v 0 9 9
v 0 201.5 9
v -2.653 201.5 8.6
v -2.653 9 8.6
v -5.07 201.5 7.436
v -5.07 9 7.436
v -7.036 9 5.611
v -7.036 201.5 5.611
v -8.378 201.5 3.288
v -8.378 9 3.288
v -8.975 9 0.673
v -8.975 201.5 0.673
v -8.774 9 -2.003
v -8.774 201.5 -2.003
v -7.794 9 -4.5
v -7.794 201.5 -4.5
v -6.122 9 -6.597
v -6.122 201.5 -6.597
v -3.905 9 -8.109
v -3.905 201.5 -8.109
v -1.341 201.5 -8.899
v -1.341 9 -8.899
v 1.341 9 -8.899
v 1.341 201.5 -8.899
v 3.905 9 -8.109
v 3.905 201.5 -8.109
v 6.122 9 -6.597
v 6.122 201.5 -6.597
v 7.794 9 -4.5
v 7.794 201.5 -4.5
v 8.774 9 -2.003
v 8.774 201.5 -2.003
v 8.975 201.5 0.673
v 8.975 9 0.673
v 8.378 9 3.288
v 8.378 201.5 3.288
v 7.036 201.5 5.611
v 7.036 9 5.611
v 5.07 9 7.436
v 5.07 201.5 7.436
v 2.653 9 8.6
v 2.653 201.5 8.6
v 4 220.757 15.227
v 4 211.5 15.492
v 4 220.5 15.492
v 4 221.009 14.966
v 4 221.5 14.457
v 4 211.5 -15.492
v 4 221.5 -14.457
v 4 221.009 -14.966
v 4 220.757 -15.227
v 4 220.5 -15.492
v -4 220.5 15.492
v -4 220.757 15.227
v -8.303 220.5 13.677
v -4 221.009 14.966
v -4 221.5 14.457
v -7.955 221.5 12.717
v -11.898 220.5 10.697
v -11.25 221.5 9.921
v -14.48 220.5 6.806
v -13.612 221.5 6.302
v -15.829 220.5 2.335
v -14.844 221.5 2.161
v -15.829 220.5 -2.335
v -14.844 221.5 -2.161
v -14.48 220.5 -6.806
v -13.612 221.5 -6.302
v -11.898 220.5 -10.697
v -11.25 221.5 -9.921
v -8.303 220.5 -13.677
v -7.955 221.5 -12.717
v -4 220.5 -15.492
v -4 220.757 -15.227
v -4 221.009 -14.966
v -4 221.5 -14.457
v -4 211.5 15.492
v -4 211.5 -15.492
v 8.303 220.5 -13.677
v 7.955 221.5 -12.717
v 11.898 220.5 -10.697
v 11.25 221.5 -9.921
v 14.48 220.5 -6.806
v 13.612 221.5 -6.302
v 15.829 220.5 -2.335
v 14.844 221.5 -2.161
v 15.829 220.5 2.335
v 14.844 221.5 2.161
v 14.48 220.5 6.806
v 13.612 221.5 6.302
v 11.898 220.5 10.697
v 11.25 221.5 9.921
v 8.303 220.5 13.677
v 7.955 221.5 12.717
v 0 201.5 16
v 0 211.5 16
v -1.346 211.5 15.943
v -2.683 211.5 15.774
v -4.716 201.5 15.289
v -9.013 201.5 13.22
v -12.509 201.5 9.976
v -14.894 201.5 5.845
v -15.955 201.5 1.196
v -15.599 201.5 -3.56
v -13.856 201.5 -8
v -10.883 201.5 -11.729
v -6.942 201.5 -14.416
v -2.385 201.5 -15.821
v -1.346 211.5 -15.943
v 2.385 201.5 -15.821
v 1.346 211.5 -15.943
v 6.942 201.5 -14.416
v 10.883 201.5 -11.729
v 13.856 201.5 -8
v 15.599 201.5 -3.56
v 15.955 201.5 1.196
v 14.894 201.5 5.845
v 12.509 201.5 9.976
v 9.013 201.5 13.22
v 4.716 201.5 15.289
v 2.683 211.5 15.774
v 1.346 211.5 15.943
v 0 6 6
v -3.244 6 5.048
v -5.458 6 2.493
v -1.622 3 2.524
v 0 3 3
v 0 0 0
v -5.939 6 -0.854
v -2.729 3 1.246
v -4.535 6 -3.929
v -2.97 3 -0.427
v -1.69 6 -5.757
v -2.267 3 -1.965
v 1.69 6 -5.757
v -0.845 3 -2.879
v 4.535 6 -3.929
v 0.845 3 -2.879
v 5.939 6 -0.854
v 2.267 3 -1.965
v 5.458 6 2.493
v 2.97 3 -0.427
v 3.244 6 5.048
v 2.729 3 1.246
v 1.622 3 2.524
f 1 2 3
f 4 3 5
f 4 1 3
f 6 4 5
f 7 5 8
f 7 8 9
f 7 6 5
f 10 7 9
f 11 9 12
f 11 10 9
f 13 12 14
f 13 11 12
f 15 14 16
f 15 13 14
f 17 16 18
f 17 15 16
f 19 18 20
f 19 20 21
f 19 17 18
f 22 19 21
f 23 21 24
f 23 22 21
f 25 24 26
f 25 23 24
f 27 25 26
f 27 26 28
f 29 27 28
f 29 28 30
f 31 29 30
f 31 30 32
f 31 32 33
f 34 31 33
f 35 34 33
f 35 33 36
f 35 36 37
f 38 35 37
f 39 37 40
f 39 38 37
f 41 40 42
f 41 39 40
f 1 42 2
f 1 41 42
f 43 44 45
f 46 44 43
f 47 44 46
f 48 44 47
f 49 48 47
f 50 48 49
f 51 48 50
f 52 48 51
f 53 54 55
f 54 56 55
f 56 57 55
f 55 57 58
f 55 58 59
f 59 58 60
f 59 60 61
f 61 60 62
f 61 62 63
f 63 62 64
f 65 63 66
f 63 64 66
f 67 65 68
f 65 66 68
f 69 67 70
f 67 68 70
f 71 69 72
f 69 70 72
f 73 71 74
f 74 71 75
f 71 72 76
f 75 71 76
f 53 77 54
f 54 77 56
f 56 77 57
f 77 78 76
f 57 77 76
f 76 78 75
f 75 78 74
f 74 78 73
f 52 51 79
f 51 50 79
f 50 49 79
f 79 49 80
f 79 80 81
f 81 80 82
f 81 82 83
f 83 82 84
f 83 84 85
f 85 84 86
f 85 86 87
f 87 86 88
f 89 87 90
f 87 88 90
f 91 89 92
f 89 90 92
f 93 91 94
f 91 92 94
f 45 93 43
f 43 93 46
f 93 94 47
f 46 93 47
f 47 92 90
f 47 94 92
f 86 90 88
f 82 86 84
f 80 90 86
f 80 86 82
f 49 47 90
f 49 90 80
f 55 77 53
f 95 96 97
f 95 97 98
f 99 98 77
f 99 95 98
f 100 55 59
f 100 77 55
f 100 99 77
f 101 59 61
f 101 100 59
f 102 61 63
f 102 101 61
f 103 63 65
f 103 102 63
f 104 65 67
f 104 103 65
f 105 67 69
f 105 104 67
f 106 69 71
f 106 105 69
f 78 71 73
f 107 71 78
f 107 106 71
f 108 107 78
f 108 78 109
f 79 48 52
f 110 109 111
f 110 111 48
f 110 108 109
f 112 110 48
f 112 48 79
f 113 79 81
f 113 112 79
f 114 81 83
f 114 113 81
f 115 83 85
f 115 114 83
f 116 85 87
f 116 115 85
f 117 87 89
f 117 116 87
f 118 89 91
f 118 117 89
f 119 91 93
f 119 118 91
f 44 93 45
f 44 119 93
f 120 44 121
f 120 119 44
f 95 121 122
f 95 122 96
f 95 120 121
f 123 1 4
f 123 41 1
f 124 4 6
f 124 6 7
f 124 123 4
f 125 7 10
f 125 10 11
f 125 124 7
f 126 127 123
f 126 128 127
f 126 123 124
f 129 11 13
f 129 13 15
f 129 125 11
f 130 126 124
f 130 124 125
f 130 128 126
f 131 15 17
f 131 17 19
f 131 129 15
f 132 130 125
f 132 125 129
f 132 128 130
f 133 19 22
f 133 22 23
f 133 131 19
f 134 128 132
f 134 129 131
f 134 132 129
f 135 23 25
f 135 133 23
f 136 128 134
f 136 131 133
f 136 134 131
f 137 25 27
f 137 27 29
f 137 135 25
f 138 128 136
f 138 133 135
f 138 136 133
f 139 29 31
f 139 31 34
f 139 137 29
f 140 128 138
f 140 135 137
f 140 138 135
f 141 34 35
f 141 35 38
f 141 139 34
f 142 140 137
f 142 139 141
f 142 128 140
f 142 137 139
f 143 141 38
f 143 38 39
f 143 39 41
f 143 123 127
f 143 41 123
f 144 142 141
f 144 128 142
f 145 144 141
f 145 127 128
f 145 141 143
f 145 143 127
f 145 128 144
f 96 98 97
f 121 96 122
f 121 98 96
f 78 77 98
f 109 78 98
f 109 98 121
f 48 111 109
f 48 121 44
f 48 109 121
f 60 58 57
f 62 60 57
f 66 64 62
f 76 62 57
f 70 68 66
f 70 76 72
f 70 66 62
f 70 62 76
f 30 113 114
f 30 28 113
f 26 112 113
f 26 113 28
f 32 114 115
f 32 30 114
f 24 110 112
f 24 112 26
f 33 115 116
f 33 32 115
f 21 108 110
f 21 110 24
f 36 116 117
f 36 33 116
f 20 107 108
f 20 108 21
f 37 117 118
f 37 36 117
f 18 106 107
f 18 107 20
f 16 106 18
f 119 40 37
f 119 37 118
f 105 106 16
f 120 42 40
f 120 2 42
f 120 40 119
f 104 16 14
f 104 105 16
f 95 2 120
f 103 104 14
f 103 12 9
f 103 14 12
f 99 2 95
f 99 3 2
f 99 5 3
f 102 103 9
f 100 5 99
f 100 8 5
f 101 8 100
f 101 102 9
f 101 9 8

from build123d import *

# Parameters (mm, degrees)
CHAMFER_1_SIZE           = 9
CUT_EXTRUDE_1_DEPTH      = 223.652756552
CUT_EXTRUDE_1_DEPTH_BACK = 223.652756552
SKETCH_2_W               = 8
SKETCH_2_H               = 10
CHAMFER_2_SIZE           = 1


with BuildPart() as part:
    # Эскиз1 → Повернуть1 (revolve)
    with BuildSketch(Plane.XY, mode=Mode.PRIVATE) as revolve_1_sk:
        Polygon((0, 0), (0, 221.5), (16, 221.5), (16, 201.5), (9, 201.5), (9, 0), align=None)
    revolve(revolve_1_sk.sketch.rotate(Axis((0, 0, 0), (0, -1, 0)), 90), axis=Axis((0, 0, 0), (0, -1, 0)))

    # Фаска1
    chamfer_1_edges = [part.edges().sort_by_distance(p)[0] for p in [
        (0, 0, -9),
    ]]
    chamfer(chamfer_1_edges, length=CHAMFER_1_SIZE - 0.0001)  # a hair under: the kernel refuses the full size

    # Эскиз2 → Вырез-Вытянуть1 (cut, two sides: drawn at the far end of the back side and taken through both)
    with BuildSketch(Plane.XY.offset(-CUT_EXTRUDE_1_DEPTH_BACK)):
        with Locations((0, 216.5)):
            Rectangle(SKETCH_2_W, SKETCH_2_H)
    extrude(amount=CUT_EXTRUDE_1_DEPTH + CUT_EXTRUDE_1_DEPTH_BACK, mode=Mode.SUBTRACT)

    # Фаска2
    chamfer_2_edges = [part.edges().sort_by_distance(p)[0] for p in [
        (16, 221.5, 0),
        (-16, 221.5, 0),
    ]]
    chamfer(chamfer_2_edges, length=CHAMFER_2_SIZE)


solid = part.part
